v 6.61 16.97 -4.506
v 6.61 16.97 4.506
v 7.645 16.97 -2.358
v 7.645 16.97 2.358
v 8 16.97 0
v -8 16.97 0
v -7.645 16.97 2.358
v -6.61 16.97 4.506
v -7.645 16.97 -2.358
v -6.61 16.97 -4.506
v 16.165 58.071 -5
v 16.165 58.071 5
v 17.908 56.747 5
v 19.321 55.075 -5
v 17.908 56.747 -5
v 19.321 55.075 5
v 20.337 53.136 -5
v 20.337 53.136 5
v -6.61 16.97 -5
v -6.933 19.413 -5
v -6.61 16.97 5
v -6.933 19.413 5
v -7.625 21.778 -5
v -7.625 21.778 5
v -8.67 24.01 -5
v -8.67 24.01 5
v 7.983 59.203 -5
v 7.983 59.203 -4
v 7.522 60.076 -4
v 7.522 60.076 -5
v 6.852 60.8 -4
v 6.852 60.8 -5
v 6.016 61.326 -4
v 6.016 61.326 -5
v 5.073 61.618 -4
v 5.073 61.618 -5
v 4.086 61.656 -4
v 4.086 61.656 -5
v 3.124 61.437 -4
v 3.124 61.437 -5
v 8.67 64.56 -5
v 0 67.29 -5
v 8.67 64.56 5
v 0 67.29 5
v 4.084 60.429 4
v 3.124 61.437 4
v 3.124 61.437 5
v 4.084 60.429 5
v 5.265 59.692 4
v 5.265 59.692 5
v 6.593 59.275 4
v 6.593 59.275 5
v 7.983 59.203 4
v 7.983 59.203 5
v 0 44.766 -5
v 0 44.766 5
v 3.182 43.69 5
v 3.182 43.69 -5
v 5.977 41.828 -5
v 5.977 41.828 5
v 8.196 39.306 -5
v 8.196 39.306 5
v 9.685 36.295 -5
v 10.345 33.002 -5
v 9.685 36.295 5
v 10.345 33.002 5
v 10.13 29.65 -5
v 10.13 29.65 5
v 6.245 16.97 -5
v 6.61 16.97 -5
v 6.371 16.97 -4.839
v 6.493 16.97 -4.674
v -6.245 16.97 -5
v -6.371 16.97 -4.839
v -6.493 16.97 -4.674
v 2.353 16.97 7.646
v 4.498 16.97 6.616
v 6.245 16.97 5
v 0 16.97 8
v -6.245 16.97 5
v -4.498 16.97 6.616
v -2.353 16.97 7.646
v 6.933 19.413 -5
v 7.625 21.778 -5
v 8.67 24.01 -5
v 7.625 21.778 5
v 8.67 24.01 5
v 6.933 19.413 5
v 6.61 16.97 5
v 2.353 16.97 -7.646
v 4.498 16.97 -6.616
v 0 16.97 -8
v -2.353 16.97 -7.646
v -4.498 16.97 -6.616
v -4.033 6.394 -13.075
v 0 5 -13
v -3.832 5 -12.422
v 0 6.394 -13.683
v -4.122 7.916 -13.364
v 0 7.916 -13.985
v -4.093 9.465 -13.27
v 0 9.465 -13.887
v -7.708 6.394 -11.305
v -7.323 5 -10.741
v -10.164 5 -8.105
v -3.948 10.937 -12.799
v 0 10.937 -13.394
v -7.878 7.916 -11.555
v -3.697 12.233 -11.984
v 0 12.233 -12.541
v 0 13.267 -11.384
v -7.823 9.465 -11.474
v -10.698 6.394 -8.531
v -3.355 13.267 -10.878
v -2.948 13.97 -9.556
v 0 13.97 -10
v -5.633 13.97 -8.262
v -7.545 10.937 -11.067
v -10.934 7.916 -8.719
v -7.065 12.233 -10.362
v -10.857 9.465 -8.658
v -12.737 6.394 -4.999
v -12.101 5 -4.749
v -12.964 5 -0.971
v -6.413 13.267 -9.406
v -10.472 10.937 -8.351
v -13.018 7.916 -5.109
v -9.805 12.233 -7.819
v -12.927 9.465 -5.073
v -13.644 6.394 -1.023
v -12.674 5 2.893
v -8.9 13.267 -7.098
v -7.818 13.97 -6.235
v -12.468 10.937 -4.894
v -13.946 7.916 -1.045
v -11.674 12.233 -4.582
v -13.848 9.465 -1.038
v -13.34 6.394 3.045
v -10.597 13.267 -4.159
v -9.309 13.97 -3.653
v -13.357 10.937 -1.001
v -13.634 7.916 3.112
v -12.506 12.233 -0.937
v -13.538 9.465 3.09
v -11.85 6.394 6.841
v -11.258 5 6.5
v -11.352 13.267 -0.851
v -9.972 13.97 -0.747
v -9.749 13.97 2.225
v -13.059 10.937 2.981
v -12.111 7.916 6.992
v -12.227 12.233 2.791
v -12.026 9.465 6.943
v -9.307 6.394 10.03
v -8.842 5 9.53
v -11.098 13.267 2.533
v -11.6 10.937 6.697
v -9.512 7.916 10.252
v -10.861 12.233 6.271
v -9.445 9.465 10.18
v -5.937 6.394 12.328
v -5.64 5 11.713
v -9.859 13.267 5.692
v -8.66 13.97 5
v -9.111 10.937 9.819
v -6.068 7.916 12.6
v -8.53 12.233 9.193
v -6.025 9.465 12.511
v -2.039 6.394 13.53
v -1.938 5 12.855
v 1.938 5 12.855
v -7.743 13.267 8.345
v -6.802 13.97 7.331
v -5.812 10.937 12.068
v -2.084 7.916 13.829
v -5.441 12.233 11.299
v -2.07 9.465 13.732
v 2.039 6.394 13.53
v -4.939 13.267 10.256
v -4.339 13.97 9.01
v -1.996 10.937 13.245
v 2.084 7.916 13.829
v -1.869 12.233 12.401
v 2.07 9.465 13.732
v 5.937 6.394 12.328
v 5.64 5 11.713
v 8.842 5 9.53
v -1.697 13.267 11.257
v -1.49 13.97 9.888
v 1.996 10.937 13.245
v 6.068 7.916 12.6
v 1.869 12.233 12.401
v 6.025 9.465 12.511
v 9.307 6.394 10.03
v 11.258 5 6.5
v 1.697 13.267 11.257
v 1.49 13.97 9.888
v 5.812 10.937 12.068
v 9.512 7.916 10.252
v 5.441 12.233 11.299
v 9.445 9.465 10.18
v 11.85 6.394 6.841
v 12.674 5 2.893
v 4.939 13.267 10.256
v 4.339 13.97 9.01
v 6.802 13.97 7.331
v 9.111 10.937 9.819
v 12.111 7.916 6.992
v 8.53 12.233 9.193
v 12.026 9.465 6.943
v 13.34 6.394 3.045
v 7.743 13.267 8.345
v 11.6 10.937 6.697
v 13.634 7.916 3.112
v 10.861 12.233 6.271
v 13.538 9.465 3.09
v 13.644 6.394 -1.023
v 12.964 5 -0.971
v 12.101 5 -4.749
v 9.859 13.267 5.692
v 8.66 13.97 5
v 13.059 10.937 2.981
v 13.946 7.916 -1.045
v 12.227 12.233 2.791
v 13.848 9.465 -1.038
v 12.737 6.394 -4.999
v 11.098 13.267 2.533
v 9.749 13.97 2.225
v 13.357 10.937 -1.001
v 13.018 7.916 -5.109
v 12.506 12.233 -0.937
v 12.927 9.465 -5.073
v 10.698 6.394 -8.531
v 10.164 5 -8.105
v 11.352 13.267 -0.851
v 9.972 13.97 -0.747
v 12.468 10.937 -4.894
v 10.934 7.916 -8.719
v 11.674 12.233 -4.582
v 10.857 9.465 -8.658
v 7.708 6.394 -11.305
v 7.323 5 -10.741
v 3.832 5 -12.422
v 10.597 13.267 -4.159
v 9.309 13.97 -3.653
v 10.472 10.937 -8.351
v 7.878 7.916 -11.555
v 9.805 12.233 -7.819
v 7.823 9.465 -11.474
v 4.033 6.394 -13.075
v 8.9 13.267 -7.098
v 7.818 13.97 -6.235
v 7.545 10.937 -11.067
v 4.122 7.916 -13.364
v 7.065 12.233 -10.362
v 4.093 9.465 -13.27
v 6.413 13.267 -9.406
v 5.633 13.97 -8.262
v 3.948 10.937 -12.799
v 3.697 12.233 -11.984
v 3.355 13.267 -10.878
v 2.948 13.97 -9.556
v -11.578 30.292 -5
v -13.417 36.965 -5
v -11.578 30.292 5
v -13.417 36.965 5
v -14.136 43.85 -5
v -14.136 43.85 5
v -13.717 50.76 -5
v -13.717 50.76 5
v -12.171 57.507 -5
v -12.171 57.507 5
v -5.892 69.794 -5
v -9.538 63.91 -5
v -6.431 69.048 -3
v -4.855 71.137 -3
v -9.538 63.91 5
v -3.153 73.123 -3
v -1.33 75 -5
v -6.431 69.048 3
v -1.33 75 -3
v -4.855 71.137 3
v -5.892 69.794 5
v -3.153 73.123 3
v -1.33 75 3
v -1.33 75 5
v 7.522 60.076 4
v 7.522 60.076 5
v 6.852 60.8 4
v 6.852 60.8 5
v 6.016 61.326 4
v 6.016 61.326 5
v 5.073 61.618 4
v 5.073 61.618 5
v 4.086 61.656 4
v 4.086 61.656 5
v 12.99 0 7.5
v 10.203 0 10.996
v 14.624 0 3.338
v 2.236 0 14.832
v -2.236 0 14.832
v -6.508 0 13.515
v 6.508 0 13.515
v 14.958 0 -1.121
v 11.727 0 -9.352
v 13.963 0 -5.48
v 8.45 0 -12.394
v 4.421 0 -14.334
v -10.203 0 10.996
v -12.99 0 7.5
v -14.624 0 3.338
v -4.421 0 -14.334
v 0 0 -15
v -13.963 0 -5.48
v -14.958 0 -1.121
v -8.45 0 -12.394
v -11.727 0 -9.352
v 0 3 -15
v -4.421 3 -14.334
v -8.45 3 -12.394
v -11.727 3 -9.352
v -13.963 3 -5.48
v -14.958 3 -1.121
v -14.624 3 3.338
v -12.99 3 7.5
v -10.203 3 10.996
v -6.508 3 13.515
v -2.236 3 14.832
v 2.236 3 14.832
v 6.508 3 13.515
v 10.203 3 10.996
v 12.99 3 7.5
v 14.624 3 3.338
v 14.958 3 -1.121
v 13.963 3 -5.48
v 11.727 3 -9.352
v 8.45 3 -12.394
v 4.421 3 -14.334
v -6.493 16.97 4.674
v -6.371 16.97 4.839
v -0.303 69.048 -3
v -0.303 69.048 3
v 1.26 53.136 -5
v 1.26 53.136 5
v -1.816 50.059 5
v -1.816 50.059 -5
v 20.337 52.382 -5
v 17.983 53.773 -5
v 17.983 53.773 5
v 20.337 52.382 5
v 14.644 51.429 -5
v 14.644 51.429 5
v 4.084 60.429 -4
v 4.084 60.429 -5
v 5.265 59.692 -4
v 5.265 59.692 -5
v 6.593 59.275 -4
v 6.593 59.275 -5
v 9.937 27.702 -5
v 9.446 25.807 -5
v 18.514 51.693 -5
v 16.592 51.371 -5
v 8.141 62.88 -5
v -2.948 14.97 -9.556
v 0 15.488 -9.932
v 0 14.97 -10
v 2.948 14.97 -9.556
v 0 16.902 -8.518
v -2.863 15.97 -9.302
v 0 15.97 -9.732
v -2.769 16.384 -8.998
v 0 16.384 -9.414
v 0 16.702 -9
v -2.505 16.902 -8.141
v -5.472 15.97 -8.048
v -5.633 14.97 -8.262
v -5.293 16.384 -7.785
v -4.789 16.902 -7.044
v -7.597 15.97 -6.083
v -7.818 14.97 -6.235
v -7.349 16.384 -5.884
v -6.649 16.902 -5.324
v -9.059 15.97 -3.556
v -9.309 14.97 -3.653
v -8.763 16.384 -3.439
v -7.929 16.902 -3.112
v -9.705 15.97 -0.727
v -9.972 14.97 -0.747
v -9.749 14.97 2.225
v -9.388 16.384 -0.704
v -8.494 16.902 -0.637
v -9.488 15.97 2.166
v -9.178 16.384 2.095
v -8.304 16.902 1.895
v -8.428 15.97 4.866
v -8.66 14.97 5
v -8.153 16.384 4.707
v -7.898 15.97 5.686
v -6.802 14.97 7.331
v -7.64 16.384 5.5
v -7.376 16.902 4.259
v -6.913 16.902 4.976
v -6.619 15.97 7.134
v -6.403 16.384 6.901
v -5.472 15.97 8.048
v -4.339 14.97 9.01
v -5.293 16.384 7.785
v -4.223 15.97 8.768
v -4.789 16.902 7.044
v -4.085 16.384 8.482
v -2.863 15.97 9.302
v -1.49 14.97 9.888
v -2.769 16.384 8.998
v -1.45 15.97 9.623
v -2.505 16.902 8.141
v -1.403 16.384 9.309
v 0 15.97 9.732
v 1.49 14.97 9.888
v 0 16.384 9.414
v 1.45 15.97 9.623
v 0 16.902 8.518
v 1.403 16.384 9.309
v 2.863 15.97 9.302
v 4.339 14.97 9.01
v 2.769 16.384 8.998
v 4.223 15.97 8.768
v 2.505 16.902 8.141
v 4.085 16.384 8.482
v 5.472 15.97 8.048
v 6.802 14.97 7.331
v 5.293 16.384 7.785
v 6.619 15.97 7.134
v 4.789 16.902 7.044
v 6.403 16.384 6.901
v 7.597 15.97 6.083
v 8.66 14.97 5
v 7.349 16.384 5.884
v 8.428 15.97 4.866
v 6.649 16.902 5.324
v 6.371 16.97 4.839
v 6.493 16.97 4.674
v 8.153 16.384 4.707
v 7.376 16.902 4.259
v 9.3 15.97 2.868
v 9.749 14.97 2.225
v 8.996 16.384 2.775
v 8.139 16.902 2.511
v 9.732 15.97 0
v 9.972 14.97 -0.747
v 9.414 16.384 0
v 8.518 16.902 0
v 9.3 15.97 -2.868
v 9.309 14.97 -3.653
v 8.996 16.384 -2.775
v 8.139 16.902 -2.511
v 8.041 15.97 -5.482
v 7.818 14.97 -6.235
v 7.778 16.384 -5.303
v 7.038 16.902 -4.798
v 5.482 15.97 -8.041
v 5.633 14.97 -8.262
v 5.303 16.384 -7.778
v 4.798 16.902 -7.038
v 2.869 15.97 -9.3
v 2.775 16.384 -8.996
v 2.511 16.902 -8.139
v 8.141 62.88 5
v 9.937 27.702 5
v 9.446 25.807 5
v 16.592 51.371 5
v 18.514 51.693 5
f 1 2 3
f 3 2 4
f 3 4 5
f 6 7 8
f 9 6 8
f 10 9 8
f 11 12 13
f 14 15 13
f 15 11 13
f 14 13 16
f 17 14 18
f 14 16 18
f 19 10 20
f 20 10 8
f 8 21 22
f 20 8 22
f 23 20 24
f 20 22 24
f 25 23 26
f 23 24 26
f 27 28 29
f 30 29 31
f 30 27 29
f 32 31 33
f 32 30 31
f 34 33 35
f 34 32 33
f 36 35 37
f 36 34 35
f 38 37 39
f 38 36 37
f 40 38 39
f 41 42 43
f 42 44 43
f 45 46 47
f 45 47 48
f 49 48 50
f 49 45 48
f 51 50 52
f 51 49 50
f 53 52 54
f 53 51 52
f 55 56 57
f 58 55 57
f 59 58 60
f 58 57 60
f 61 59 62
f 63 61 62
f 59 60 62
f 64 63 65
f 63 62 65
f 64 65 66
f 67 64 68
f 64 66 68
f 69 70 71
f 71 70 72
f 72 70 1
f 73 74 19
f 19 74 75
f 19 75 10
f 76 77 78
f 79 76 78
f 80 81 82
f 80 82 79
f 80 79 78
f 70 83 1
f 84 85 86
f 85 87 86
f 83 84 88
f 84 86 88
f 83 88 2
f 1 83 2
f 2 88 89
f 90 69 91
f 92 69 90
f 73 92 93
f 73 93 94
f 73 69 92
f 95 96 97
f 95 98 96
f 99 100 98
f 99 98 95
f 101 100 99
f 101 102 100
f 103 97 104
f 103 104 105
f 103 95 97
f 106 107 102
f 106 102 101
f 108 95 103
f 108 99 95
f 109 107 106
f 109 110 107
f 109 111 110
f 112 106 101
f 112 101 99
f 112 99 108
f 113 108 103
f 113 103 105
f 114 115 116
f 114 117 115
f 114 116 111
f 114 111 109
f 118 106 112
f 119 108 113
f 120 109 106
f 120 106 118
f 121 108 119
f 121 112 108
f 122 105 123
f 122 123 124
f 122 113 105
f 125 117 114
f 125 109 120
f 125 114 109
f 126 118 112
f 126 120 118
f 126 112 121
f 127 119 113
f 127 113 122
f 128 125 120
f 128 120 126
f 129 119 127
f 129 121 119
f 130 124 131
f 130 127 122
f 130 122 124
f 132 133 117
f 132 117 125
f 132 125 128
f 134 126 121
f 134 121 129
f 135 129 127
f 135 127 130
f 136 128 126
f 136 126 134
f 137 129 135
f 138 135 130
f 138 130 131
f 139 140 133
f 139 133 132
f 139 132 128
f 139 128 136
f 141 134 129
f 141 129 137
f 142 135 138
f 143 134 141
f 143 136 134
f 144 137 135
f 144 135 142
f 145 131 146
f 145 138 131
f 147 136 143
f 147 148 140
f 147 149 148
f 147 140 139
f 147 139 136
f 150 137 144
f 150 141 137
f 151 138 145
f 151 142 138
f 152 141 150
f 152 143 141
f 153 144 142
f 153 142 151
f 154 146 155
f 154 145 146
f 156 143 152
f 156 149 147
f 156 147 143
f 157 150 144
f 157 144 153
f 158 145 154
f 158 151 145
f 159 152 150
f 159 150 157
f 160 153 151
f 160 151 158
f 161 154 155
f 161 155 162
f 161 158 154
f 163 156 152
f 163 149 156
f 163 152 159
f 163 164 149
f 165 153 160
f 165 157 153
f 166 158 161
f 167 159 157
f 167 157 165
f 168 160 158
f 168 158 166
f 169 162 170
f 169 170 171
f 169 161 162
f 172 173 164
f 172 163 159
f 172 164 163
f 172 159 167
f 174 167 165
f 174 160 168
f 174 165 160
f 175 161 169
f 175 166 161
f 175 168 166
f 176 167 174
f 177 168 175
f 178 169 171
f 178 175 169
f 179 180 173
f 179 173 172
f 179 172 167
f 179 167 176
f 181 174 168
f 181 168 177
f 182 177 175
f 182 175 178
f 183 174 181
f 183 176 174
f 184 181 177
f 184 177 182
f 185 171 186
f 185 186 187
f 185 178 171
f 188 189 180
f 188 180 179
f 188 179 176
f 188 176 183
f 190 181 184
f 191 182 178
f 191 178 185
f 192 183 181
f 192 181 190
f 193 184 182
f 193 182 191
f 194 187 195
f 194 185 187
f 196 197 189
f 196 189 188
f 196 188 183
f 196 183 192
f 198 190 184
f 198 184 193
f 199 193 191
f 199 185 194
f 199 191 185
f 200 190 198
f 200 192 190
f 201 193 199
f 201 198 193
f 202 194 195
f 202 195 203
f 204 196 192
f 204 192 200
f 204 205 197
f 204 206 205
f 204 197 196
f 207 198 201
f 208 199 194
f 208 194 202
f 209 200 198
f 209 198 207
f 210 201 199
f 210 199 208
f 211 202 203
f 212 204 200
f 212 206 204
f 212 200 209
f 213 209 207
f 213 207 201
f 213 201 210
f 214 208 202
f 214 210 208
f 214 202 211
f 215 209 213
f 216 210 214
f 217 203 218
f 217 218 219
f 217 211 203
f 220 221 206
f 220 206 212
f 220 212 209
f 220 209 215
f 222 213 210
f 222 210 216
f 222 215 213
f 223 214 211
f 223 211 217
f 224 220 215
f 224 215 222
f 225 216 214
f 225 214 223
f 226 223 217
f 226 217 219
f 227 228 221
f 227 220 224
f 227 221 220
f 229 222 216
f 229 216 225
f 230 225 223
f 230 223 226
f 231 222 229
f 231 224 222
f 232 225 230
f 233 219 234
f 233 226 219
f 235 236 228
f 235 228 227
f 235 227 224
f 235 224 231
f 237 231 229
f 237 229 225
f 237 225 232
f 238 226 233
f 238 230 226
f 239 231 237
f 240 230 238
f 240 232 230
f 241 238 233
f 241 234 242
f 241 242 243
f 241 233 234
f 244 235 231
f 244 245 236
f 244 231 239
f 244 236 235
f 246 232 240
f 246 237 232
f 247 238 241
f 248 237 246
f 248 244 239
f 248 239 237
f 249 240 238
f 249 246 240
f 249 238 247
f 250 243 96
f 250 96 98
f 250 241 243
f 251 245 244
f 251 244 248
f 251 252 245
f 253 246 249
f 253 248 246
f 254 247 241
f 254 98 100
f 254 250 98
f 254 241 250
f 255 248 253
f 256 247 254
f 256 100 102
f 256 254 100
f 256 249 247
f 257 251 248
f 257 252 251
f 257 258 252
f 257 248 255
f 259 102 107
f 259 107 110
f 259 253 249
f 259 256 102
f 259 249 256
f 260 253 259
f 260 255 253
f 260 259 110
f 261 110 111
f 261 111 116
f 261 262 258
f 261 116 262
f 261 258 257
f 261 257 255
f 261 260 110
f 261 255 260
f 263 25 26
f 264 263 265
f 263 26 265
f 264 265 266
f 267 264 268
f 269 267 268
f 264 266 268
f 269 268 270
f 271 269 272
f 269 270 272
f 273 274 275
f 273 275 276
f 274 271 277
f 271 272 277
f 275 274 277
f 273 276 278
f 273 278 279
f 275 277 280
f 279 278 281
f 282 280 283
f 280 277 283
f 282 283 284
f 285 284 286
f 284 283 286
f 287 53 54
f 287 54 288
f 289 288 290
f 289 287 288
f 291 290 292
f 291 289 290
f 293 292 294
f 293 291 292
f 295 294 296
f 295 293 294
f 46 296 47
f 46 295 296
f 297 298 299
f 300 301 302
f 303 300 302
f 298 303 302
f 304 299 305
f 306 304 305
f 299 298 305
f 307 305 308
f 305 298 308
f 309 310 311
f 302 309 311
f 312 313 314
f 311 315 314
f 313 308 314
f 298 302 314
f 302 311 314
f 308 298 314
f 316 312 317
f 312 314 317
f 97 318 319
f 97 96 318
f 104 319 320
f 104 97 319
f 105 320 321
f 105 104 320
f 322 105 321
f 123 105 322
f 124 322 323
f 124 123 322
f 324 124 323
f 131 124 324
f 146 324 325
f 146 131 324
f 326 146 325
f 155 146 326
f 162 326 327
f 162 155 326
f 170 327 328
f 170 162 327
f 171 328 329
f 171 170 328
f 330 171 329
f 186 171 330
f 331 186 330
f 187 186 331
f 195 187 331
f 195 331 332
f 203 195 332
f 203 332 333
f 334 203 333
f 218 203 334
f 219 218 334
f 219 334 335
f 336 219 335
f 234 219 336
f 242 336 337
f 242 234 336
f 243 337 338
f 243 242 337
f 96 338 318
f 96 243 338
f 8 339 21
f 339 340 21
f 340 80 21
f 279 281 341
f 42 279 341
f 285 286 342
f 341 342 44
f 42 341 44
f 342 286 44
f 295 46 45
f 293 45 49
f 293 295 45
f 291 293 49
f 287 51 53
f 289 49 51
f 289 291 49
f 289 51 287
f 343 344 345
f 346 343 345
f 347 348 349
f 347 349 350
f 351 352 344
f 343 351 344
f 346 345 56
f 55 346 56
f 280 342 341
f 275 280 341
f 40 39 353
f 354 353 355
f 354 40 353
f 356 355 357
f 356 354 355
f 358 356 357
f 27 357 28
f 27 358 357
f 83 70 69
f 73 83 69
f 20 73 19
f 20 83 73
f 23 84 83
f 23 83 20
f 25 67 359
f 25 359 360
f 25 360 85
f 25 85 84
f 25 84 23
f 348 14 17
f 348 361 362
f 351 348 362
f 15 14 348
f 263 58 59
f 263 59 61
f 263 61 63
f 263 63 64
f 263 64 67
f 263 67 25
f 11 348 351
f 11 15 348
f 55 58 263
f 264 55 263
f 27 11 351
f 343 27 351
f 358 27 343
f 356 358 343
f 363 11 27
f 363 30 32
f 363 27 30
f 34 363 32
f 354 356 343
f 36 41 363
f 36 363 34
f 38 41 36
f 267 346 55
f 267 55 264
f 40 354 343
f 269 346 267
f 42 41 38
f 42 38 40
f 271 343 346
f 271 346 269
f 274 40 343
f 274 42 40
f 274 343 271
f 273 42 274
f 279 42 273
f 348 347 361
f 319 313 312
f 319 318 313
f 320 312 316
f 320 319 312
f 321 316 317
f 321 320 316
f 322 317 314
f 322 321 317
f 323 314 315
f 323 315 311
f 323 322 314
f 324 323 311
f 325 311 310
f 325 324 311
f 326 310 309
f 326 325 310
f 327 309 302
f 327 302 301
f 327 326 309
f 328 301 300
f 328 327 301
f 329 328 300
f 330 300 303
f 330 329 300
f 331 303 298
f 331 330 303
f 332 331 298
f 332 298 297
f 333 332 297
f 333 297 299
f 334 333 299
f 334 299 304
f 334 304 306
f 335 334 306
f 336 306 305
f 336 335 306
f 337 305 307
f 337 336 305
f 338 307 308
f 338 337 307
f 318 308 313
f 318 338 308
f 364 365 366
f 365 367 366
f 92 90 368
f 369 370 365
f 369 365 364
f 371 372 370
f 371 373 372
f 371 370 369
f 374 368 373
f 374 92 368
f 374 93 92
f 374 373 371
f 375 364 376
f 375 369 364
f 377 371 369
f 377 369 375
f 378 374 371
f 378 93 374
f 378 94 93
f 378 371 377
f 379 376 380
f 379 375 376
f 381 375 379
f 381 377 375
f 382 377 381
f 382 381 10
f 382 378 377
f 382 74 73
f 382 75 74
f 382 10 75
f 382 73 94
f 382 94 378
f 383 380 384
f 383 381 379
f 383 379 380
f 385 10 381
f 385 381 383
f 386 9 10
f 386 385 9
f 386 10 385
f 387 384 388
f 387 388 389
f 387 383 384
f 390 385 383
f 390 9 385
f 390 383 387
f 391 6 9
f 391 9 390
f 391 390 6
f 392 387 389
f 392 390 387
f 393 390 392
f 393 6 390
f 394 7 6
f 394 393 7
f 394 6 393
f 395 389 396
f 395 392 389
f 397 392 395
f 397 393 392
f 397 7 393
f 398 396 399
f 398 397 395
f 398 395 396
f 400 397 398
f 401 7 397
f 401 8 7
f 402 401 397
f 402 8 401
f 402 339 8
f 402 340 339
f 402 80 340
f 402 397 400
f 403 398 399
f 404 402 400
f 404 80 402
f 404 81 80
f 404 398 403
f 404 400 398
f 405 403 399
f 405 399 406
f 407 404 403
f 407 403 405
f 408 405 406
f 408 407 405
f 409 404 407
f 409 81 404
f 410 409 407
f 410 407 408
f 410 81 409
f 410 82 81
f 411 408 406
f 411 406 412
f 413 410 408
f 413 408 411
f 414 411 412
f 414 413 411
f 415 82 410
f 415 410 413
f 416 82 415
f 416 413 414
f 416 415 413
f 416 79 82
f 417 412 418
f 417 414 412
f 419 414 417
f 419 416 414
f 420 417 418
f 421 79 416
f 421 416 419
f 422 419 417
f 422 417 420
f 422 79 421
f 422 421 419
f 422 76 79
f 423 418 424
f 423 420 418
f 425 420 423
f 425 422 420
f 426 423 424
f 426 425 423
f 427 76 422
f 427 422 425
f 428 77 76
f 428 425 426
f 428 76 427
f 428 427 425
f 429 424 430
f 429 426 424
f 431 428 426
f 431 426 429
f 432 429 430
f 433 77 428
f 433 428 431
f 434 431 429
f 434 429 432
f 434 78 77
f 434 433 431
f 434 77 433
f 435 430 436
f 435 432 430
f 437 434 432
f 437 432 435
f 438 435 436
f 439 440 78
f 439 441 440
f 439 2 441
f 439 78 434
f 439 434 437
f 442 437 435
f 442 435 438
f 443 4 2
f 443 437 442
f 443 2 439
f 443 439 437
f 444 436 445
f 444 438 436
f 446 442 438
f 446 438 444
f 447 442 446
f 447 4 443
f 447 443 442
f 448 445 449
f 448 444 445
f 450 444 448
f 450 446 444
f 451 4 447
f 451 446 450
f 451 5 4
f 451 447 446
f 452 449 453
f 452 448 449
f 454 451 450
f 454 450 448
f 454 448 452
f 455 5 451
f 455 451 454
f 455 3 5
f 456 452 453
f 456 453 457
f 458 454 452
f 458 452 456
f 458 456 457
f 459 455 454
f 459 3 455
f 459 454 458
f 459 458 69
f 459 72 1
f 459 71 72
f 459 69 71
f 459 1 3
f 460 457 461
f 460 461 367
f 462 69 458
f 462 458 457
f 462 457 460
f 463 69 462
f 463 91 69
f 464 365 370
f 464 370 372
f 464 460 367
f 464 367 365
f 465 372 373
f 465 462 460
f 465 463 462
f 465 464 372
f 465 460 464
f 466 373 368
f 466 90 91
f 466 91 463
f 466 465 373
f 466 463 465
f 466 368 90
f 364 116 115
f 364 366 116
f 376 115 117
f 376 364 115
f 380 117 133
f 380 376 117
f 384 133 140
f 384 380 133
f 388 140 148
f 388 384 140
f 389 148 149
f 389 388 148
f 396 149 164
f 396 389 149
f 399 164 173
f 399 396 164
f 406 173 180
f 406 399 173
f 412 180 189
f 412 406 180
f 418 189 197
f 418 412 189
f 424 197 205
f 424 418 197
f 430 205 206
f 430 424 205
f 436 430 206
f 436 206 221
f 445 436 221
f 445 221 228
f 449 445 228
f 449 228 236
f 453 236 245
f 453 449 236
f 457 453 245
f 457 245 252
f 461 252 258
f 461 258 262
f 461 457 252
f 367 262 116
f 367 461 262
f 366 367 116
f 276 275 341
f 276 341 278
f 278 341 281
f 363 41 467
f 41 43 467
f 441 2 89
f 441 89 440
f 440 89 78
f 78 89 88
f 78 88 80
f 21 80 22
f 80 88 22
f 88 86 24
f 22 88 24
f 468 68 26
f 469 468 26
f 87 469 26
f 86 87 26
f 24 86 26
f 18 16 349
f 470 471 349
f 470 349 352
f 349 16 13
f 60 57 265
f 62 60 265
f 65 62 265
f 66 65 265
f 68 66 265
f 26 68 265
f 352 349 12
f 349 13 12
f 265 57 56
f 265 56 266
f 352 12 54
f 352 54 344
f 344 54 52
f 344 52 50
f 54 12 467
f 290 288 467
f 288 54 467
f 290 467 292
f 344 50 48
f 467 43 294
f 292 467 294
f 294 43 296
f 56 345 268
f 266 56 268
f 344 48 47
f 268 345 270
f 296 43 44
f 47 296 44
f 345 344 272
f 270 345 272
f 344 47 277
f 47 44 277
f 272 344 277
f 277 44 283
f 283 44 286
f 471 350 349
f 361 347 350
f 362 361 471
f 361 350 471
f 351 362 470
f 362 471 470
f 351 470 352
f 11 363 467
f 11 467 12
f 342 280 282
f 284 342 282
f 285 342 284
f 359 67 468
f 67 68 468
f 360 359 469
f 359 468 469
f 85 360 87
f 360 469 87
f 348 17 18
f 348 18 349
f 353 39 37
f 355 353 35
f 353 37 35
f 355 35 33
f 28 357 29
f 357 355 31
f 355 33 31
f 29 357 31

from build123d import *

# Parameters (mm, degrees)
SKETCH2_W               = 15
SKETCH2_H               = 3
BOSS_EXTRUDE1_DEPTH     = 5
SKETCH4_W               = 6
SKETCH4_H               = 7.676307803
CUT_EXTRUDE1_DEPTH      = 10
FILLET2_R               = 10
FILLET3_R               = 10
CUT_EXTRUDE2_DEPTH      = 80.142875261
CUT_EXTRUDE2_DEPTH_BACK = 80.142875261
BOSS_EXTRUDE2_DEPTH     = 4


with BuildPart() as part:
    # Sketch2 → Revolve1 (revolve)
    with BuildSketch(Plane.XY, mode=Mode.PRIVATE) as revolve1_sk:
        with BuildLine():
            ThreePointArc((-10, 14.97), (-9.414213562, 16.384213562), (-8, 16.97))
            Line((-8, 16.97), (0, 16.97))
            Line((0, 16.97), (0, 14.97))
            Line((0, 14.97), (0, 13.97))
            Line((0, 13.97), (0, 5))
            Line((0, 5), (0, 3))
            Line((0, 3), (-15, 3))
            Line((-15, 3), (-13, 5))
            ThreePointArc((-13, 5), (-13.688325627, 10.216881481), (-10, 13.97))
            Line((-10, 13.97), (-10, 14.97))
        make_face()
        with Locations((-7.5, 1.5)):
            Rectangle(SKETCH2_W, SKETCH2_H)
    revolve(revolve1_sk.sketch.rotate(Axis((0, 5, 0), (0, 1, 0)), 270), axis=Axis((0, 5, 0), (0, 1, 0)))

    # Sketch3 → Boss-Extrude1 (add, symmetric)
    with BuildSketch(Plane.XY):
        with BuildLine():
            ThreePointArc((0, 44.765662821), (8.195556272, 39.305823104), (10.13, 29.65))
            ThreePointArc((10.13, 29.65), (9.728307106, 26.745012699), (8.67, 24.01))
            ThreePointArc((8.67, 24.01), (7.233209761, 20.609032371), (6.61, 16.97))
            Line((6.61, 16.97), (-6.61, 16.97))
            ThreePointArc((-6.61, 16.97), (-7.233209761, 20.609032371), (-8.67, 24.01))
            ThreePointArc((-8.67, 24.01), (-13.717238878, 50.759844741), (-1.33, 75))
            Line((-1.33, 75), (0, 67.29))
            Line((0, 67.29), (8.67, 64.56))
            Line((8.67, 64.56), (8.14100346, 62.88))
            Line((8.14100346, 62.88), (20.337027919, 55.57))
            Line((20.337027919, 55.57), (20.337027919, 53.136090211))
            Line((20.337027919, 53.136090211), (17.983362656, 53.773319693))
            Line((17.983362656, 53.773319693), (20.337027919, 52.381882691))
            Line((20.337027919, 52.381882691), (20.337027919, 50.702180422))
            Line((20.337027919, 50.702180422), (1.260409295, 53.136090211))
            Line((1.260409295, 53.136090211), (-1.816215968, 50.059464948))
            Line((-1.816215968, 50.059464948), (0, 44.765662821))
        make_face()
    extrude(amount=BOSS_EXTRUDE1_DEPTH, both=True)

    # Sketch4 → Cut-Extrude1 (cut)
    with BuildSketch(Plane(origin=(0, 0, 0), x_dir=(0, 0, -1), z_dir=(1, 0, 0))):
        with Locations((0, 72.886493521)):
            Rectangle(SKETCH4_W, SKETCH4_H)
    extrude(amount=-CUT_EXTRUDE1_DEPTH, mode=Mode.SUBTRACT)

    # Fillet2
    # the kernel refuses this fillet: 10 mm, written as the material it takes off along each edge
    with BuildSketch(Plane(origin=(20.337027919, 55.57, 17.159563067), x_dir=(-0.8577290982340794, 0.5141019296234484, 0), z_dir=(0, 0, -1))) as fillet2_piece_1:
        with BuildLine():
            CenterArc((4.863825227, -10), FILLET2_R, 90, 37.698787392)
            Line((-1.251277719, -2.087635248), (-1.373579778, -1.929387953))
            ThreePointArc((-1.373579778, -1.929387953), (-0.797184679, -0.940997238), (-0.17154582, 0.102820386))
            Line((-0.17154582, 0.102820386), (0, 0.2))
            Line((0, 0.2), (4.863825227, 0.2))
            Line((4.863825227, 0.2), (4.863825227, 0))
        make_face()
    extrude(amount=34.319126134, mode=Mode.SUBTRACT)

    # Fillet3
    # the kernel refuses this fillet: 10 mm, written as the material it takes off along each edge
    with BuildSketch(Plane(origin=(20.337027919, 50.702180422, 19.348952899), x_dir=(-0.9919589424380495, 0.12656009053878878, 0), z_dir=(0, 0, -1))) as fillet3_piece_1:
        with BuildLine():
            CenterArc((5.73958116, 10), FILLET3_R, 236.447572357, 33.552427643)
            Line((0.212583271, 1.666195686), (0.102043313, 1.4995196))
            ThreePointArc((0.102043313, 1.4995196), (-0.092100153, 0.858409861), (-0.198391788, 0.025312018))
            Line((-0.198391788, 0.025312018), (0, -0.2))
            Line((0, -0.2), (5.73958116, -0.2))
            Line((5.73958116, -0.2), (5.73958116, 0))
        make_face()
    extrude(amount=38.697905798, mode=Mode.SUBTRACT)

    # Sketch5 → Cut-Extrude2 (cut, two sides: drawn at the far end of the back side and taken through both)
    with BuildSketch(Plane.XY.offset(-CUT_EXTRUDE2_DEPTH_BACK)):
        with BuildLine():
            ThreePointArc((3.123689943, 61.436717182), (5.265012371, 59.692471778), (7.983104726, 59.202953935))
            ThreePointArc((7.983104726, 59.202953935), (6.01602485, 61.326253313), (3.123689943, 61.436717182))
        make_face()
    extrude(amount=CUT_EXTRUDE2_DEPTH + CUT_EXTRUDE2_DEPTH_BACK, mode=Mode.SUBTRACT)

    # Sketch5<3> → Boss-Extrude2 (add, symmetric)
    with BuildSketch(Plane.XY):
        with BuildLine():
            ThreePointArc((3.123689943, 61.436717182), (5.265012371, 59.692471778), (7.983104726, 59.202953935))
            ThreePointArc((7.983104726, 59.202953935), (6.01602485, 61.326253313), (3.123689943, 61.436717182))
        make_face()
    extrude(amount=BOSS_EXTRUDE2_DEPTH, both=True)


solid = part.part
